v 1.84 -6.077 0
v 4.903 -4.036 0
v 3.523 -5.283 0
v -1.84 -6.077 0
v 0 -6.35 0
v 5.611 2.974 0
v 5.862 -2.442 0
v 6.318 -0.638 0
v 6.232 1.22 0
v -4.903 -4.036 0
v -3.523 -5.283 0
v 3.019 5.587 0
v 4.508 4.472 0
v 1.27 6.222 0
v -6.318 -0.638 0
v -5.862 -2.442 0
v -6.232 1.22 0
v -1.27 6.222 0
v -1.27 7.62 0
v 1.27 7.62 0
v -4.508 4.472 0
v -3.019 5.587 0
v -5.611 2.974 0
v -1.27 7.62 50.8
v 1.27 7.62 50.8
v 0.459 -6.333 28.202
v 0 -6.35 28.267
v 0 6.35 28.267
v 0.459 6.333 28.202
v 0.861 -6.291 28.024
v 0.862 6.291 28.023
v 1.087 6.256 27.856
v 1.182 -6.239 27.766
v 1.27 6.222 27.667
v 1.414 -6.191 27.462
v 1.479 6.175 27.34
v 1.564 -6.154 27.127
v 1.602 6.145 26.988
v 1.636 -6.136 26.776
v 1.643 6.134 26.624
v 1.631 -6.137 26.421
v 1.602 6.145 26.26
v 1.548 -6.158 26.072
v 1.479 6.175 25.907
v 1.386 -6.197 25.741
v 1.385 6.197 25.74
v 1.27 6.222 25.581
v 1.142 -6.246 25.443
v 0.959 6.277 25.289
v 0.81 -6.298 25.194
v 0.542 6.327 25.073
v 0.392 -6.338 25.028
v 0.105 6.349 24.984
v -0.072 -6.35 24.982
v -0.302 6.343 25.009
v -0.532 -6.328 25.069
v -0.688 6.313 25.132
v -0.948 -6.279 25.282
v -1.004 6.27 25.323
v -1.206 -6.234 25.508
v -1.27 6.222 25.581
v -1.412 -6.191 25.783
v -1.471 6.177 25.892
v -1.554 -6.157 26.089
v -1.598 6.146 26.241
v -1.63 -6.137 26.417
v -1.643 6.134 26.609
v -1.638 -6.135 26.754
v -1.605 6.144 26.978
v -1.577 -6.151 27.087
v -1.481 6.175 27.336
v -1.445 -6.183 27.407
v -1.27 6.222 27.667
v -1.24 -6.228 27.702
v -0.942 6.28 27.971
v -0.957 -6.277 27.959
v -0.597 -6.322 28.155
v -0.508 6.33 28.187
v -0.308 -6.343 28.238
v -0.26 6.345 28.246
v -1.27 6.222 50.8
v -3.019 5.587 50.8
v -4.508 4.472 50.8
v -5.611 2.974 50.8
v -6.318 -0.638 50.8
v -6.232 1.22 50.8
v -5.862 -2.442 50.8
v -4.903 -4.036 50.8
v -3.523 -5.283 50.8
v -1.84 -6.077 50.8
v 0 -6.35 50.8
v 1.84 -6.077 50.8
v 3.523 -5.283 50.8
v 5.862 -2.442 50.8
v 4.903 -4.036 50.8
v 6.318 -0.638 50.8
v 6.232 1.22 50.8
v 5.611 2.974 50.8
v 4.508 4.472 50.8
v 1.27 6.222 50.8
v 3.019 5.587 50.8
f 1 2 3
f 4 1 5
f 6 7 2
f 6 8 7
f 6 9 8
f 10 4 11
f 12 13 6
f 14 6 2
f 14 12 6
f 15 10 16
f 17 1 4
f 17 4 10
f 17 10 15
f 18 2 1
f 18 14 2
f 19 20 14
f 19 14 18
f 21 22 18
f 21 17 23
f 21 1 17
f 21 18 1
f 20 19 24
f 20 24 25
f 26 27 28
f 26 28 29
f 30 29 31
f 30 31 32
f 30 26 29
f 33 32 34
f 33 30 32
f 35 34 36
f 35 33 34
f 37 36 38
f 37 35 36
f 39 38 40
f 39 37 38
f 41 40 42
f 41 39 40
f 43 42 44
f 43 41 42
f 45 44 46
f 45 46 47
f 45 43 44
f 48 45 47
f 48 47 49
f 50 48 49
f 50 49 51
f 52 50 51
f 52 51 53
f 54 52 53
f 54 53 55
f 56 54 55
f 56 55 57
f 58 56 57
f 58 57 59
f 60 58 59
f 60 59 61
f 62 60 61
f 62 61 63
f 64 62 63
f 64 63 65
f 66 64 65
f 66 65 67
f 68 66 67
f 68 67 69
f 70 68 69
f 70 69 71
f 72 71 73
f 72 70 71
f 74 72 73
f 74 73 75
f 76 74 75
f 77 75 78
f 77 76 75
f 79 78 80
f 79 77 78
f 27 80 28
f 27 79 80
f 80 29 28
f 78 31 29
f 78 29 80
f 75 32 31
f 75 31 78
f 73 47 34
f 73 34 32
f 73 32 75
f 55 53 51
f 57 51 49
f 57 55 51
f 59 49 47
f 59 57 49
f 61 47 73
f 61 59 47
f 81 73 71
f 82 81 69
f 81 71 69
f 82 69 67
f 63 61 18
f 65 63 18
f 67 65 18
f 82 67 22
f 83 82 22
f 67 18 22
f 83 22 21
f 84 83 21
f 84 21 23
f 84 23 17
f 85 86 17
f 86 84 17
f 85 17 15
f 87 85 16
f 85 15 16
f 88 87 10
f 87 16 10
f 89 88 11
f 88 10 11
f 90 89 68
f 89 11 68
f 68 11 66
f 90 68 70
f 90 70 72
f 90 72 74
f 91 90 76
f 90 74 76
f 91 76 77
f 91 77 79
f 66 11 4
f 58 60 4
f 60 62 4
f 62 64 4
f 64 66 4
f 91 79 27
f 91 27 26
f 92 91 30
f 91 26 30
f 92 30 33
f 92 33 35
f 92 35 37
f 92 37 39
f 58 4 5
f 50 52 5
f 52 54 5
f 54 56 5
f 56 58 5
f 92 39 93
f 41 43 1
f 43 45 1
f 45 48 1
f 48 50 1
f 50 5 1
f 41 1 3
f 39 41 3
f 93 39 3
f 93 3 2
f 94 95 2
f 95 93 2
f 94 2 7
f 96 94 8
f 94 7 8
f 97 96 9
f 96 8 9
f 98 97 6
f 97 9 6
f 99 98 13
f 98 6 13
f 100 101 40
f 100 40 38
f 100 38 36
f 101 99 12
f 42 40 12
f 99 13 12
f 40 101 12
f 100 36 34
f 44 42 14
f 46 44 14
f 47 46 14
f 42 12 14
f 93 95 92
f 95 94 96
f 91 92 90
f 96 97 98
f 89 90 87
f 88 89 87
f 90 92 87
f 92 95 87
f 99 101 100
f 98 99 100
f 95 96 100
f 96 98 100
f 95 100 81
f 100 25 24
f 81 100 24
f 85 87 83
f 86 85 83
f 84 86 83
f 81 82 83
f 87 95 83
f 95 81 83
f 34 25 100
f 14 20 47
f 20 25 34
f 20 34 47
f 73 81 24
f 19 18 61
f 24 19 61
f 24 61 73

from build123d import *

# Parameters (mm, degrees)
SKETCH1_R               = 6.35
BOSS_EXTRUDE1_DEPTH     = 50.8
CUT_EXTRUDE1_DEPTH      = 52.587643869
CUT_EXTRUDE1_DEPTH_BACK = 52.587643869
SKETCH2_R               = 1.643209115
BOSS_EXTRUDE2_START     = -50.8
BOSS_EXTRUDE2_DEPTH     = 50.8


with BuildPart() as part:
    # Sketch1 → Boss-Extrude1 (new body)
    with BuildSketch(Plane.XY):
        Circle(SKETCH1_R)
    extrude(amount=BOSS_EXTRUDE1_DEPTH)

    # Sketch2 → Cut-Extrude1 (cut, two sides: drawn at the far end of the back side and taken through both)
    with BuildSketch(Plane(origin=(0, 0, 0), x_dir=(1, 0, 0), z_dir=(0, 1, 0)).offset(-CUT_EXTRUDE1_DEPTH_BACK)):
        with Locations(Location((0, -26.623855977, 0), (0, 0, 270))):
            Circle(SKETCH2_R)
    extrude(amount=CUT_EXTRUDE1_DEPTH + CUT_EXTRUDE1_DEPTH_BACK, mode=Mode.SUBTRACT)

    # Sketch4 → Boss-Extrude2 (add)
    with BuildSketch(Plane.XY.offset(50.8).offset(BOSS_EXTRUDE2_START)):
        with BuildLine():
            Line((-1.27, 6.221703947), (-1.27, 7.62))
            Line((-1.27, 7.62), (1.27, 7.62))
            Line((1.27, 7.62), (1.27, 6.221703947))
            ThreePointArc((1.27, 6.221703947), (0, 6.35), (-1.27, 6.221703947))
        make_face()
    extrude(amount=BOSS_EXTRUDE2_DEPTH)


solid = part.part
